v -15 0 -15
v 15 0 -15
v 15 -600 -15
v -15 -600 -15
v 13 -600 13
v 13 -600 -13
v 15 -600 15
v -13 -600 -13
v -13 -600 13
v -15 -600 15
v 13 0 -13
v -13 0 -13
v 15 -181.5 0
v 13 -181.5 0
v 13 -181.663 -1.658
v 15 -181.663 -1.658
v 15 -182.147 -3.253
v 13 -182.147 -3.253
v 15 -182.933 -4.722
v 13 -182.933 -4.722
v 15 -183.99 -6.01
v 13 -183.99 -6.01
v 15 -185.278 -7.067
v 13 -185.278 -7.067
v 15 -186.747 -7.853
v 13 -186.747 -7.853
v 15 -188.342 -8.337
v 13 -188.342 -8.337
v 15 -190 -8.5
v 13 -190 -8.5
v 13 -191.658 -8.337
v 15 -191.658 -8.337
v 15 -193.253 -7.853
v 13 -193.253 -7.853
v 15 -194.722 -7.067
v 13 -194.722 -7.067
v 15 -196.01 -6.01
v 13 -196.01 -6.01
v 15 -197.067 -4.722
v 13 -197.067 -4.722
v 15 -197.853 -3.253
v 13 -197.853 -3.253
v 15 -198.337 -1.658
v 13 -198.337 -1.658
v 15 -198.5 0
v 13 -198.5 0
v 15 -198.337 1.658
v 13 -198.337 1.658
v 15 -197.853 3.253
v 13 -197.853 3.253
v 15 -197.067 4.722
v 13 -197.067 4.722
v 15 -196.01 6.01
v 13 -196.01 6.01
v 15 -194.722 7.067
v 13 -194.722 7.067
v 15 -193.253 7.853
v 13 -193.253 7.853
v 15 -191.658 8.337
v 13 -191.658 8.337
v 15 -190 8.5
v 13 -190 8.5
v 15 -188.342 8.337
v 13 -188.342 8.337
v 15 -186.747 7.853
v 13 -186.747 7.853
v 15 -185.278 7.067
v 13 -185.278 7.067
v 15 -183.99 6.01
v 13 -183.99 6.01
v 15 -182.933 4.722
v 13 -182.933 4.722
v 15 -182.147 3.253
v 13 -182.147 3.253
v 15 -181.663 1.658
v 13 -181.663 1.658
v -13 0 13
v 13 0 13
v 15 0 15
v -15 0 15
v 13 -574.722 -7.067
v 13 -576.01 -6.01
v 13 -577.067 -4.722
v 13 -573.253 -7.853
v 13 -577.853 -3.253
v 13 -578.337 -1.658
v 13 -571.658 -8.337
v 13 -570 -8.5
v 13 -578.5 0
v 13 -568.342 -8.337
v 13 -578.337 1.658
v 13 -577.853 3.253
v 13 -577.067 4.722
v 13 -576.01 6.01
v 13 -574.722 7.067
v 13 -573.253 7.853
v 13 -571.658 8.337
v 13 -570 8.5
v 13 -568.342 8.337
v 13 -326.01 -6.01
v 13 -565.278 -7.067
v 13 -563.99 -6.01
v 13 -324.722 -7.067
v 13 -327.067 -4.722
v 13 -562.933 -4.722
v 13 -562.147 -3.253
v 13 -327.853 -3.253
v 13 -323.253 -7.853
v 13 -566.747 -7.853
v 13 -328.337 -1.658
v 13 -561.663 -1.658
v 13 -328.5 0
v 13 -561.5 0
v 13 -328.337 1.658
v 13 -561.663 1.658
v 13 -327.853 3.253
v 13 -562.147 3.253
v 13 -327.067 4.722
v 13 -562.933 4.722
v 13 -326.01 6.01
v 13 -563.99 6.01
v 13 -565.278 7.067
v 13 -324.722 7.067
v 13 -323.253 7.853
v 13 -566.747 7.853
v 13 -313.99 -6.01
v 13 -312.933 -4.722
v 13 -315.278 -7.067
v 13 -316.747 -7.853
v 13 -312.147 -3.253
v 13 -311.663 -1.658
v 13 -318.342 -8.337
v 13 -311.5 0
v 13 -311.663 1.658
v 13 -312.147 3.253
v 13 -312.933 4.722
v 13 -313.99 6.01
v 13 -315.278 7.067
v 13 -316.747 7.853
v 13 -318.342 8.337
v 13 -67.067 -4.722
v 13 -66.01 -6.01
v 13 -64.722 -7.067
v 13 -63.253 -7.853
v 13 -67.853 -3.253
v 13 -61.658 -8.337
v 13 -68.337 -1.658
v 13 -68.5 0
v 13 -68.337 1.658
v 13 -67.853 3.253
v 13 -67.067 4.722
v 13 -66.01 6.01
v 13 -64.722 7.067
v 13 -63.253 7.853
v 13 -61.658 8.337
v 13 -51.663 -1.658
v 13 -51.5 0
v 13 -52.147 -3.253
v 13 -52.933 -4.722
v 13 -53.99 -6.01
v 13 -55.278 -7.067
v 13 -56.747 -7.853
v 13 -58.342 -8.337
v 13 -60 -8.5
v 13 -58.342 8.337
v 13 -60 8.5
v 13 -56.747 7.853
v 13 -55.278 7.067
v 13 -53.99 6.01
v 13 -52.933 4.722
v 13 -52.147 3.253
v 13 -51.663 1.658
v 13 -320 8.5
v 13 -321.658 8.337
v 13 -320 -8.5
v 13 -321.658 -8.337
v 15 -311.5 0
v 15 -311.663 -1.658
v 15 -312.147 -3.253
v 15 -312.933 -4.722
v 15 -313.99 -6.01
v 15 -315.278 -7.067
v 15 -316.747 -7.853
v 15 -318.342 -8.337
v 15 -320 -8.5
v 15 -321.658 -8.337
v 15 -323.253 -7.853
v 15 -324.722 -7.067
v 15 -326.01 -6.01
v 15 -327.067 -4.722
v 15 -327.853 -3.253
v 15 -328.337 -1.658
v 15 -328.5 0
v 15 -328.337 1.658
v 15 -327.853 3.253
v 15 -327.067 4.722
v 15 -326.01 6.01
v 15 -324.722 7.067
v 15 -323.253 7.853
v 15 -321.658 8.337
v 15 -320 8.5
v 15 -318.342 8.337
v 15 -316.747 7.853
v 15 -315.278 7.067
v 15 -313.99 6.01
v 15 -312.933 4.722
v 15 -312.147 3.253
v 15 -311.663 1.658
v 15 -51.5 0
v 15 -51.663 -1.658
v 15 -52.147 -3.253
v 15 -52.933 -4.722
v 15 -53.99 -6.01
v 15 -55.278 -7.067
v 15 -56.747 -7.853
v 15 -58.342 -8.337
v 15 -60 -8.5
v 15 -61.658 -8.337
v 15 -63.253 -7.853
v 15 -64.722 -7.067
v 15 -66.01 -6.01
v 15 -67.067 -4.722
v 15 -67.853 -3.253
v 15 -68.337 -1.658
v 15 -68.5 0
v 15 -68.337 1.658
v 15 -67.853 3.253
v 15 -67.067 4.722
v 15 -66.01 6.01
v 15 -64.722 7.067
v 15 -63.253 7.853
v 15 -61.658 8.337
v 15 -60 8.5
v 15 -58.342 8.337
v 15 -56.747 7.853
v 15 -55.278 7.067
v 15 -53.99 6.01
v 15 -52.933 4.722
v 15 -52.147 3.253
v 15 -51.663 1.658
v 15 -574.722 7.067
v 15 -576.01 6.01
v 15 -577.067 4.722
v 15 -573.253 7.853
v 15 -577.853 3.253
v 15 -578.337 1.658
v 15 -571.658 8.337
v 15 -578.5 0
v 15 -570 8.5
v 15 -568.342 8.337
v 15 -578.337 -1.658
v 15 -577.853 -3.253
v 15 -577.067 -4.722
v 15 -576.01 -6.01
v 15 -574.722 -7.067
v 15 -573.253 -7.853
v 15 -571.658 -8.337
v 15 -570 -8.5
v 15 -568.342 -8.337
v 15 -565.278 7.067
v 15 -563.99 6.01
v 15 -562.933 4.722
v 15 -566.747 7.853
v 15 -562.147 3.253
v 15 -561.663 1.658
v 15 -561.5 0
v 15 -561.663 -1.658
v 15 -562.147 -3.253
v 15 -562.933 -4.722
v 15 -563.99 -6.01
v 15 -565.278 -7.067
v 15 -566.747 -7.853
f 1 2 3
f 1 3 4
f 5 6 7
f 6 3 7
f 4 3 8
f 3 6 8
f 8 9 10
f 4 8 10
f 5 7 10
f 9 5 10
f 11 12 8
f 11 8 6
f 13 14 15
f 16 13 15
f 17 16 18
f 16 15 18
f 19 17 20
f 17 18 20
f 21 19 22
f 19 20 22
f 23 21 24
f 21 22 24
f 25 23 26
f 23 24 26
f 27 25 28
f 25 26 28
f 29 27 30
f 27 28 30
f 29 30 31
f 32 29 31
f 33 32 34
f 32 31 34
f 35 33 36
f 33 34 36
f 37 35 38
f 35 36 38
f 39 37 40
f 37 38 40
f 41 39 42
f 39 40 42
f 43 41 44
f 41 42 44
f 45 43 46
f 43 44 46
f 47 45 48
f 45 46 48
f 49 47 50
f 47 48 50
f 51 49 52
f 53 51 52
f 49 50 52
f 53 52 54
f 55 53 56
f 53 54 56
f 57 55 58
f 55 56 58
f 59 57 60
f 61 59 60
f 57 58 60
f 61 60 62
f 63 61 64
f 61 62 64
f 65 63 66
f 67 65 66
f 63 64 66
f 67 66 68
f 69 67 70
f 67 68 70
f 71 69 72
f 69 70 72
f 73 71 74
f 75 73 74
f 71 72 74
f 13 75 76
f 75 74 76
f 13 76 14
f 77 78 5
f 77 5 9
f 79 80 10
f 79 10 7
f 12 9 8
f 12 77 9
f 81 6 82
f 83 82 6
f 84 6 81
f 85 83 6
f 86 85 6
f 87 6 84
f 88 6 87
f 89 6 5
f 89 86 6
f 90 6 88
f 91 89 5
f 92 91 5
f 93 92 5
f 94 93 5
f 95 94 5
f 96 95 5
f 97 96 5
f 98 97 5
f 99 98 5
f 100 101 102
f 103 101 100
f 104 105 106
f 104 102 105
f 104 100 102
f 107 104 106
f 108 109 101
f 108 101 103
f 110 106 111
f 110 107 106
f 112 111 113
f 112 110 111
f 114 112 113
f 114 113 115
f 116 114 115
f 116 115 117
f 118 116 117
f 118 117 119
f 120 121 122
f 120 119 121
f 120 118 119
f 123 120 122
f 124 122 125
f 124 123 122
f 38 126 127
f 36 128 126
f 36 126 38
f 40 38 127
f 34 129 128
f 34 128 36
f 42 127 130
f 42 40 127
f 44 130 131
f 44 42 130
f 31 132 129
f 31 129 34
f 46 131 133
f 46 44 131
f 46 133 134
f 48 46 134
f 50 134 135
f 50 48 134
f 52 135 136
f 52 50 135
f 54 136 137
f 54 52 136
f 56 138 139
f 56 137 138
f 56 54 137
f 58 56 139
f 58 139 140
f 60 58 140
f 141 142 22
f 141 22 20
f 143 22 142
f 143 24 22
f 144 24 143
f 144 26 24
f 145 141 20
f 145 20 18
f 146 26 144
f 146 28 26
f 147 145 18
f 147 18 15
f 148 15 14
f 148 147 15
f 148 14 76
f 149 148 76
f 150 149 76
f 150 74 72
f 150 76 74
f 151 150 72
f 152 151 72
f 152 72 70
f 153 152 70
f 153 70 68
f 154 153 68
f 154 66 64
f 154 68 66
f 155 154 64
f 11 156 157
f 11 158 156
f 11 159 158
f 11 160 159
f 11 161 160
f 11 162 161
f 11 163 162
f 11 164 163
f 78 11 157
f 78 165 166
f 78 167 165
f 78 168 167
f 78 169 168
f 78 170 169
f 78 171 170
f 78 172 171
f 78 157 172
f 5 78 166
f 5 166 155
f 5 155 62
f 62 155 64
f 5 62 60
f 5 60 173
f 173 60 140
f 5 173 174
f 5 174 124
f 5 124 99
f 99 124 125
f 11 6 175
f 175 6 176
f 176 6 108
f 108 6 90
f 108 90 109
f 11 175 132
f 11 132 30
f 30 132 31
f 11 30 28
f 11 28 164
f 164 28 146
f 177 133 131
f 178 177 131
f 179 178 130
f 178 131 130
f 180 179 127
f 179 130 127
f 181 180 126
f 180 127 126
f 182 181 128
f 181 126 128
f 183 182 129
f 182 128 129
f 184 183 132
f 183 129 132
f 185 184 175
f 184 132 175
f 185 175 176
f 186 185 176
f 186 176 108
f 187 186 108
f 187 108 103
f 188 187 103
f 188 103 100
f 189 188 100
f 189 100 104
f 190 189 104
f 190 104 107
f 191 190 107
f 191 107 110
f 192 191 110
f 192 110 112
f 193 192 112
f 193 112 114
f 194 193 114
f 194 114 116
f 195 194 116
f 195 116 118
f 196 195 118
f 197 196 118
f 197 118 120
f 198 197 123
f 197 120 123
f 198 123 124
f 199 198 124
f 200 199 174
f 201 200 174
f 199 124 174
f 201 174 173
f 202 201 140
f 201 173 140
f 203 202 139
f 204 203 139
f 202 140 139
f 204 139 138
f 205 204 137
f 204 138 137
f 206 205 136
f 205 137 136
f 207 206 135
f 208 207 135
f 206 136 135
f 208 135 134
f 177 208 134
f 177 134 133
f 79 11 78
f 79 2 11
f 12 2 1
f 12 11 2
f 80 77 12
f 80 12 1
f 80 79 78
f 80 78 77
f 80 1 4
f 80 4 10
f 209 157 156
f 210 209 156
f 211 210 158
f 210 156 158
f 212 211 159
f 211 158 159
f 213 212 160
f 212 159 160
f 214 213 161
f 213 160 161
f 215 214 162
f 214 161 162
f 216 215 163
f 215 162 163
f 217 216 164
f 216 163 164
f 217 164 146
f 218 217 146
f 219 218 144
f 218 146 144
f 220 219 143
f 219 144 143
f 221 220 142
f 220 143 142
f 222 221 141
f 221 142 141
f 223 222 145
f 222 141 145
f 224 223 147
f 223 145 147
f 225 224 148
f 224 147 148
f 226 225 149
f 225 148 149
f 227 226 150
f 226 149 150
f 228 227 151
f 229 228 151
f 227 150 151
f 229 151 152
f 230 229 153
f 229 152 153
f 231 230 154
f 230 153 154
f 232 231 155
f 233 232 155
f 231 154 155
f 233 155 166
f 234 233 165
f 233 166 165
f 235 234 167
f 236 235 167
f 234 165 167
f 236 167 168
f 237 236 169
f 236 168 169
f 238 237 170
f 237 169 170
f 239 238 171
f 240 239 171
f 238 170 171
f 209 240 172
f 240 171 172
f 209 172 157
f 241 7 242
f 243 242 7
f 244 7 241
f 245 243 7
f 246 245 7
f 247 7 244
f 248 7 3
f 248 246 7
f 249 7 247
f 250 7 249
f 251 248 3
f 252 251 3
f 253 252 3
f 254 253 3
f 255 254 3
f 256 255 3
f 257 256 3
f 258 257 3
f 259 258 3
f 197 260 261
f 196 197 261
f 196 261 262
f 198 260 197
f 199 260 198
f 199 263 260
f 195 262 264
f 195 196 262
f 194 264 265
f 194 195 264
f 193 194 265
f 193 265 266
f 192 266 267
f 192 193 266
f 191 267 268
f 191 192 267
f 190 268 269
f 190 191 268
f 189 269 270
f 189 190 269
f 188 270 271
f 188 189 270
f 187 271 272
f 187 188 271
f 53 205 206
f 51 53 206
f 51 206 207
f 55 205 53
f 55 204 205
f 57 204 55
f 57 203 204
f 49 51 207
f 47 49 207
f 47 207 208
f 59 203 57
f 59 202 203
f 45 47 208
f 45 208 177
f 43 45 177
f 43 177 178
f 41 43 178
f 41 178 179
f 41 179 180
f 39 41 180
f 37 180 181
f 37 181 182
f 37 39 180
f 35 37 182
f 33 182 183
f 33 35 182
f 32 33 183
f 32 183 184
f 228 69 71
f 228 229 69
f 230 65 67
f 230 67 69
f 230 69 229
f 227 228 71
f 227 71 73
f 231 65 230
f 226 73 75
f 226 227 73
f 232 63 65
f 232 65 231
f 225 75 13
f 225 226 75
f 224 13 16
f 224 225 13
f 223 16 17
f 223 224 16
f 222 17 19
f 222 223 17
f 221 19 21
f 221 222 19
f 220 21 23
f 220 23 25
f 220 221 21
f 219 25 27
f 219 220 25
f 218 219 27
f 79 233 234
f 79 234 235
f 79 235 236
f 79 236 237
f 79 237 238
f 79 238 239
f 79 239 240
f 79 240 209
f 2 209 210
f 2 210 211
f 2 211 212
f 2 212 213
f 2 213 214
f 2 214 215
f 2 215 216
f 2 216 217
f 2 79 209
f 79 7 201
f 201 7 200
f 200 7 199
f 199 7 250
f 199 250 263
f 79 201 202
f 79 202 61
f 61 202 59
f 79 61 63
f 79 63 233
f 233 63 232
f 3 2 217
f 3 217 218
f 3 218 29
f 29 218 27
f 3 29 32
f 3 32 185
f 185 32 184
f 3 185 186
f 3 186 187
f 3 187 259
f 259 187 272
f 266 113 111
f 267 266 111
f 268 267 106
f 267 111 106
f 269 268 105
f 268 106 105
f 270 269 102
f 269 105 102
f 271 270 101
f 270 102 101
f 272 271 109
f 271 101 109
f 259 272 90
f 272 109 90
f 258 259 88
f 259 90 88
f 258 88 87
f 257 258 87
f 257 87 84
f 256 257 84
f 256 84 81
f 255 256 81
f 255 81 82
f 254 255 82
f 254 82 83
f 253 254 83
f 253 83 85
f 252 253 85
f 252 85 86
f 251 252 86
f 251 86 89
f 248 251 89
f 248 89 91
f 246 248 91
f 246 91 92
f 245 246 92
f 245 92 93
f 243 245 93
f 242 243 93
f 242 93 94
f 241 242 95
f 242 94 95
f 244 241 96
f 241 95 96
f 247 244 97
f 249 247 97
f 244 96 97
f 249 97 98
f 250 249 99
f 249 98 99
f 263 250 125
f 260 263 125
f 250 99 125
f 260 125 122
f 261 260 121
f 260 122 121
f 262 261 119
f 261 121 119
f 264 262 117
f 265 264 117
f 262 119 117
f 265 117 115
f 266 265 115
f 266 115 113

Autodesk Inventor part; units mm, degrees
ref_plane "YZ Plane" through (0, 0, 0) normal (1, 0, 0) x (0, 1, 0)
ref_plane "XZ Plane" through (0, 0, 0) normal (0, 1, 0) x (-1, 0, 0)
ref_plane "XY Plane" through (0, 0, 0) normal (0, 0, 1) x (1, 0, 0)
sketch "Sketch9" plane through (0, 0, 0) normal (0, 1, 0) x (-1, 0, 0)
  line L0 (15, 15) -> (-15, 15)
  line L1 (-15, 15) -> (-15, -15)
  line L2 (-15, -15) -> (15, -15)
  line L3 (15, -15) -> (15, 15)
  line L4 (15, 15) -> (-15, -15) construction
  line L5 (-15, 15) -> (15, -15) construction
  line L6 (-13, 13) -> (13, 13)
  line L7 (13, 13) -> (13, -13)
  line L8 (13, -13) -> (-13, -13)
  line L9 (-13, -13) -> (-13, 13)
  point P0 (0, 0)
  dimension "d172" = 30
  dimension "d173" = 30
  dimension "d174" = 2
extrude "Extrusion3" add sketch "Sketch9" against normal blind 600
sketch "Sketch10" plane through (0, 0, 0) normal (1, 0, 0) x (0, 1, 0)
  line L0 (0, 15) -> (0, -15) construction
  line L1 (0, 15) -> (-600, 15) construction
  line L2 (-600, -15) -> (-600, 15) construction
  line L3 (0, -15) -> (-600, -15) construction
  line L4 (-68.5, 8.5) -> (-51.5, 8.5)
  line L5 (-51.5, 8.5) -> (-51.5, -8.5)
  line L6 (-51.5, -8.5) -> (-68.5, -8.5)
  line L7 (-68.5, -8.5) -> (-68.5, 8.5)
  line L8 (-68.5, 8.5) -> (-51.5, -8.5) construction
  line L9 (-51.5, 8.5) -> (-68.5, -8.5) construction
  line L10 (-198.5, 8.5) -> (-181.5, 8.5)
  line L11 (-181.5, 8.5) -> (-181.5, -8.5)
  line L12 (-181.5, -8.5) -> (-198.5, -8.5)
  line L13 (-198.5, -8.5) -> (-198.5, 8.5)
  line L14 (-198.5, 8.5) -> (-181.5, -8.5) construction
  line L15 (-181.5, 8.5) -> (-198.5, -8.5) construction
  line L16 (-328.5, 8.5) -> (-311.5, 8.5)
  line L17 (-311.5, 8.5) -> (-311.5, -8.5)
  line L18 (-311.5, -8.5) -> (-328.5, -8.5)
  line L19 (-328.5, -8.5) -> (-328.5, 8.5)
  line L20 (-328.5, 8.5) -> (-311.5, -8.5) construction
  line L21 (-311.5, 8.5) -> (-328.5, -8.5) construction
  circle A0 centre (-570, 0) radius 8.5
  line L22 (0, 0) -> (30, 0)
  circle A1 centre (-60, 0) radius 8.5
  circle A2 centre (-190, 0) radius 8.5
  circle A3 centre (-320, 0) radius 8.5
  dimension "d177" = 17
  dimension "d178" = 17
  dimension "d181" = 30
  dimension "d182" = 90
  dimension "d183" = 220
  dimension "d184" = 350
  dimension "d185" = 600
  dimension "d186" = 17
extrude "Extrusion4" cut sketch "Sketch10" along normal through all contours A1 | A2 | A3 | A0
properties part number "APN 754 FDS 1200 way tube 1" material "Stainless Steel"
